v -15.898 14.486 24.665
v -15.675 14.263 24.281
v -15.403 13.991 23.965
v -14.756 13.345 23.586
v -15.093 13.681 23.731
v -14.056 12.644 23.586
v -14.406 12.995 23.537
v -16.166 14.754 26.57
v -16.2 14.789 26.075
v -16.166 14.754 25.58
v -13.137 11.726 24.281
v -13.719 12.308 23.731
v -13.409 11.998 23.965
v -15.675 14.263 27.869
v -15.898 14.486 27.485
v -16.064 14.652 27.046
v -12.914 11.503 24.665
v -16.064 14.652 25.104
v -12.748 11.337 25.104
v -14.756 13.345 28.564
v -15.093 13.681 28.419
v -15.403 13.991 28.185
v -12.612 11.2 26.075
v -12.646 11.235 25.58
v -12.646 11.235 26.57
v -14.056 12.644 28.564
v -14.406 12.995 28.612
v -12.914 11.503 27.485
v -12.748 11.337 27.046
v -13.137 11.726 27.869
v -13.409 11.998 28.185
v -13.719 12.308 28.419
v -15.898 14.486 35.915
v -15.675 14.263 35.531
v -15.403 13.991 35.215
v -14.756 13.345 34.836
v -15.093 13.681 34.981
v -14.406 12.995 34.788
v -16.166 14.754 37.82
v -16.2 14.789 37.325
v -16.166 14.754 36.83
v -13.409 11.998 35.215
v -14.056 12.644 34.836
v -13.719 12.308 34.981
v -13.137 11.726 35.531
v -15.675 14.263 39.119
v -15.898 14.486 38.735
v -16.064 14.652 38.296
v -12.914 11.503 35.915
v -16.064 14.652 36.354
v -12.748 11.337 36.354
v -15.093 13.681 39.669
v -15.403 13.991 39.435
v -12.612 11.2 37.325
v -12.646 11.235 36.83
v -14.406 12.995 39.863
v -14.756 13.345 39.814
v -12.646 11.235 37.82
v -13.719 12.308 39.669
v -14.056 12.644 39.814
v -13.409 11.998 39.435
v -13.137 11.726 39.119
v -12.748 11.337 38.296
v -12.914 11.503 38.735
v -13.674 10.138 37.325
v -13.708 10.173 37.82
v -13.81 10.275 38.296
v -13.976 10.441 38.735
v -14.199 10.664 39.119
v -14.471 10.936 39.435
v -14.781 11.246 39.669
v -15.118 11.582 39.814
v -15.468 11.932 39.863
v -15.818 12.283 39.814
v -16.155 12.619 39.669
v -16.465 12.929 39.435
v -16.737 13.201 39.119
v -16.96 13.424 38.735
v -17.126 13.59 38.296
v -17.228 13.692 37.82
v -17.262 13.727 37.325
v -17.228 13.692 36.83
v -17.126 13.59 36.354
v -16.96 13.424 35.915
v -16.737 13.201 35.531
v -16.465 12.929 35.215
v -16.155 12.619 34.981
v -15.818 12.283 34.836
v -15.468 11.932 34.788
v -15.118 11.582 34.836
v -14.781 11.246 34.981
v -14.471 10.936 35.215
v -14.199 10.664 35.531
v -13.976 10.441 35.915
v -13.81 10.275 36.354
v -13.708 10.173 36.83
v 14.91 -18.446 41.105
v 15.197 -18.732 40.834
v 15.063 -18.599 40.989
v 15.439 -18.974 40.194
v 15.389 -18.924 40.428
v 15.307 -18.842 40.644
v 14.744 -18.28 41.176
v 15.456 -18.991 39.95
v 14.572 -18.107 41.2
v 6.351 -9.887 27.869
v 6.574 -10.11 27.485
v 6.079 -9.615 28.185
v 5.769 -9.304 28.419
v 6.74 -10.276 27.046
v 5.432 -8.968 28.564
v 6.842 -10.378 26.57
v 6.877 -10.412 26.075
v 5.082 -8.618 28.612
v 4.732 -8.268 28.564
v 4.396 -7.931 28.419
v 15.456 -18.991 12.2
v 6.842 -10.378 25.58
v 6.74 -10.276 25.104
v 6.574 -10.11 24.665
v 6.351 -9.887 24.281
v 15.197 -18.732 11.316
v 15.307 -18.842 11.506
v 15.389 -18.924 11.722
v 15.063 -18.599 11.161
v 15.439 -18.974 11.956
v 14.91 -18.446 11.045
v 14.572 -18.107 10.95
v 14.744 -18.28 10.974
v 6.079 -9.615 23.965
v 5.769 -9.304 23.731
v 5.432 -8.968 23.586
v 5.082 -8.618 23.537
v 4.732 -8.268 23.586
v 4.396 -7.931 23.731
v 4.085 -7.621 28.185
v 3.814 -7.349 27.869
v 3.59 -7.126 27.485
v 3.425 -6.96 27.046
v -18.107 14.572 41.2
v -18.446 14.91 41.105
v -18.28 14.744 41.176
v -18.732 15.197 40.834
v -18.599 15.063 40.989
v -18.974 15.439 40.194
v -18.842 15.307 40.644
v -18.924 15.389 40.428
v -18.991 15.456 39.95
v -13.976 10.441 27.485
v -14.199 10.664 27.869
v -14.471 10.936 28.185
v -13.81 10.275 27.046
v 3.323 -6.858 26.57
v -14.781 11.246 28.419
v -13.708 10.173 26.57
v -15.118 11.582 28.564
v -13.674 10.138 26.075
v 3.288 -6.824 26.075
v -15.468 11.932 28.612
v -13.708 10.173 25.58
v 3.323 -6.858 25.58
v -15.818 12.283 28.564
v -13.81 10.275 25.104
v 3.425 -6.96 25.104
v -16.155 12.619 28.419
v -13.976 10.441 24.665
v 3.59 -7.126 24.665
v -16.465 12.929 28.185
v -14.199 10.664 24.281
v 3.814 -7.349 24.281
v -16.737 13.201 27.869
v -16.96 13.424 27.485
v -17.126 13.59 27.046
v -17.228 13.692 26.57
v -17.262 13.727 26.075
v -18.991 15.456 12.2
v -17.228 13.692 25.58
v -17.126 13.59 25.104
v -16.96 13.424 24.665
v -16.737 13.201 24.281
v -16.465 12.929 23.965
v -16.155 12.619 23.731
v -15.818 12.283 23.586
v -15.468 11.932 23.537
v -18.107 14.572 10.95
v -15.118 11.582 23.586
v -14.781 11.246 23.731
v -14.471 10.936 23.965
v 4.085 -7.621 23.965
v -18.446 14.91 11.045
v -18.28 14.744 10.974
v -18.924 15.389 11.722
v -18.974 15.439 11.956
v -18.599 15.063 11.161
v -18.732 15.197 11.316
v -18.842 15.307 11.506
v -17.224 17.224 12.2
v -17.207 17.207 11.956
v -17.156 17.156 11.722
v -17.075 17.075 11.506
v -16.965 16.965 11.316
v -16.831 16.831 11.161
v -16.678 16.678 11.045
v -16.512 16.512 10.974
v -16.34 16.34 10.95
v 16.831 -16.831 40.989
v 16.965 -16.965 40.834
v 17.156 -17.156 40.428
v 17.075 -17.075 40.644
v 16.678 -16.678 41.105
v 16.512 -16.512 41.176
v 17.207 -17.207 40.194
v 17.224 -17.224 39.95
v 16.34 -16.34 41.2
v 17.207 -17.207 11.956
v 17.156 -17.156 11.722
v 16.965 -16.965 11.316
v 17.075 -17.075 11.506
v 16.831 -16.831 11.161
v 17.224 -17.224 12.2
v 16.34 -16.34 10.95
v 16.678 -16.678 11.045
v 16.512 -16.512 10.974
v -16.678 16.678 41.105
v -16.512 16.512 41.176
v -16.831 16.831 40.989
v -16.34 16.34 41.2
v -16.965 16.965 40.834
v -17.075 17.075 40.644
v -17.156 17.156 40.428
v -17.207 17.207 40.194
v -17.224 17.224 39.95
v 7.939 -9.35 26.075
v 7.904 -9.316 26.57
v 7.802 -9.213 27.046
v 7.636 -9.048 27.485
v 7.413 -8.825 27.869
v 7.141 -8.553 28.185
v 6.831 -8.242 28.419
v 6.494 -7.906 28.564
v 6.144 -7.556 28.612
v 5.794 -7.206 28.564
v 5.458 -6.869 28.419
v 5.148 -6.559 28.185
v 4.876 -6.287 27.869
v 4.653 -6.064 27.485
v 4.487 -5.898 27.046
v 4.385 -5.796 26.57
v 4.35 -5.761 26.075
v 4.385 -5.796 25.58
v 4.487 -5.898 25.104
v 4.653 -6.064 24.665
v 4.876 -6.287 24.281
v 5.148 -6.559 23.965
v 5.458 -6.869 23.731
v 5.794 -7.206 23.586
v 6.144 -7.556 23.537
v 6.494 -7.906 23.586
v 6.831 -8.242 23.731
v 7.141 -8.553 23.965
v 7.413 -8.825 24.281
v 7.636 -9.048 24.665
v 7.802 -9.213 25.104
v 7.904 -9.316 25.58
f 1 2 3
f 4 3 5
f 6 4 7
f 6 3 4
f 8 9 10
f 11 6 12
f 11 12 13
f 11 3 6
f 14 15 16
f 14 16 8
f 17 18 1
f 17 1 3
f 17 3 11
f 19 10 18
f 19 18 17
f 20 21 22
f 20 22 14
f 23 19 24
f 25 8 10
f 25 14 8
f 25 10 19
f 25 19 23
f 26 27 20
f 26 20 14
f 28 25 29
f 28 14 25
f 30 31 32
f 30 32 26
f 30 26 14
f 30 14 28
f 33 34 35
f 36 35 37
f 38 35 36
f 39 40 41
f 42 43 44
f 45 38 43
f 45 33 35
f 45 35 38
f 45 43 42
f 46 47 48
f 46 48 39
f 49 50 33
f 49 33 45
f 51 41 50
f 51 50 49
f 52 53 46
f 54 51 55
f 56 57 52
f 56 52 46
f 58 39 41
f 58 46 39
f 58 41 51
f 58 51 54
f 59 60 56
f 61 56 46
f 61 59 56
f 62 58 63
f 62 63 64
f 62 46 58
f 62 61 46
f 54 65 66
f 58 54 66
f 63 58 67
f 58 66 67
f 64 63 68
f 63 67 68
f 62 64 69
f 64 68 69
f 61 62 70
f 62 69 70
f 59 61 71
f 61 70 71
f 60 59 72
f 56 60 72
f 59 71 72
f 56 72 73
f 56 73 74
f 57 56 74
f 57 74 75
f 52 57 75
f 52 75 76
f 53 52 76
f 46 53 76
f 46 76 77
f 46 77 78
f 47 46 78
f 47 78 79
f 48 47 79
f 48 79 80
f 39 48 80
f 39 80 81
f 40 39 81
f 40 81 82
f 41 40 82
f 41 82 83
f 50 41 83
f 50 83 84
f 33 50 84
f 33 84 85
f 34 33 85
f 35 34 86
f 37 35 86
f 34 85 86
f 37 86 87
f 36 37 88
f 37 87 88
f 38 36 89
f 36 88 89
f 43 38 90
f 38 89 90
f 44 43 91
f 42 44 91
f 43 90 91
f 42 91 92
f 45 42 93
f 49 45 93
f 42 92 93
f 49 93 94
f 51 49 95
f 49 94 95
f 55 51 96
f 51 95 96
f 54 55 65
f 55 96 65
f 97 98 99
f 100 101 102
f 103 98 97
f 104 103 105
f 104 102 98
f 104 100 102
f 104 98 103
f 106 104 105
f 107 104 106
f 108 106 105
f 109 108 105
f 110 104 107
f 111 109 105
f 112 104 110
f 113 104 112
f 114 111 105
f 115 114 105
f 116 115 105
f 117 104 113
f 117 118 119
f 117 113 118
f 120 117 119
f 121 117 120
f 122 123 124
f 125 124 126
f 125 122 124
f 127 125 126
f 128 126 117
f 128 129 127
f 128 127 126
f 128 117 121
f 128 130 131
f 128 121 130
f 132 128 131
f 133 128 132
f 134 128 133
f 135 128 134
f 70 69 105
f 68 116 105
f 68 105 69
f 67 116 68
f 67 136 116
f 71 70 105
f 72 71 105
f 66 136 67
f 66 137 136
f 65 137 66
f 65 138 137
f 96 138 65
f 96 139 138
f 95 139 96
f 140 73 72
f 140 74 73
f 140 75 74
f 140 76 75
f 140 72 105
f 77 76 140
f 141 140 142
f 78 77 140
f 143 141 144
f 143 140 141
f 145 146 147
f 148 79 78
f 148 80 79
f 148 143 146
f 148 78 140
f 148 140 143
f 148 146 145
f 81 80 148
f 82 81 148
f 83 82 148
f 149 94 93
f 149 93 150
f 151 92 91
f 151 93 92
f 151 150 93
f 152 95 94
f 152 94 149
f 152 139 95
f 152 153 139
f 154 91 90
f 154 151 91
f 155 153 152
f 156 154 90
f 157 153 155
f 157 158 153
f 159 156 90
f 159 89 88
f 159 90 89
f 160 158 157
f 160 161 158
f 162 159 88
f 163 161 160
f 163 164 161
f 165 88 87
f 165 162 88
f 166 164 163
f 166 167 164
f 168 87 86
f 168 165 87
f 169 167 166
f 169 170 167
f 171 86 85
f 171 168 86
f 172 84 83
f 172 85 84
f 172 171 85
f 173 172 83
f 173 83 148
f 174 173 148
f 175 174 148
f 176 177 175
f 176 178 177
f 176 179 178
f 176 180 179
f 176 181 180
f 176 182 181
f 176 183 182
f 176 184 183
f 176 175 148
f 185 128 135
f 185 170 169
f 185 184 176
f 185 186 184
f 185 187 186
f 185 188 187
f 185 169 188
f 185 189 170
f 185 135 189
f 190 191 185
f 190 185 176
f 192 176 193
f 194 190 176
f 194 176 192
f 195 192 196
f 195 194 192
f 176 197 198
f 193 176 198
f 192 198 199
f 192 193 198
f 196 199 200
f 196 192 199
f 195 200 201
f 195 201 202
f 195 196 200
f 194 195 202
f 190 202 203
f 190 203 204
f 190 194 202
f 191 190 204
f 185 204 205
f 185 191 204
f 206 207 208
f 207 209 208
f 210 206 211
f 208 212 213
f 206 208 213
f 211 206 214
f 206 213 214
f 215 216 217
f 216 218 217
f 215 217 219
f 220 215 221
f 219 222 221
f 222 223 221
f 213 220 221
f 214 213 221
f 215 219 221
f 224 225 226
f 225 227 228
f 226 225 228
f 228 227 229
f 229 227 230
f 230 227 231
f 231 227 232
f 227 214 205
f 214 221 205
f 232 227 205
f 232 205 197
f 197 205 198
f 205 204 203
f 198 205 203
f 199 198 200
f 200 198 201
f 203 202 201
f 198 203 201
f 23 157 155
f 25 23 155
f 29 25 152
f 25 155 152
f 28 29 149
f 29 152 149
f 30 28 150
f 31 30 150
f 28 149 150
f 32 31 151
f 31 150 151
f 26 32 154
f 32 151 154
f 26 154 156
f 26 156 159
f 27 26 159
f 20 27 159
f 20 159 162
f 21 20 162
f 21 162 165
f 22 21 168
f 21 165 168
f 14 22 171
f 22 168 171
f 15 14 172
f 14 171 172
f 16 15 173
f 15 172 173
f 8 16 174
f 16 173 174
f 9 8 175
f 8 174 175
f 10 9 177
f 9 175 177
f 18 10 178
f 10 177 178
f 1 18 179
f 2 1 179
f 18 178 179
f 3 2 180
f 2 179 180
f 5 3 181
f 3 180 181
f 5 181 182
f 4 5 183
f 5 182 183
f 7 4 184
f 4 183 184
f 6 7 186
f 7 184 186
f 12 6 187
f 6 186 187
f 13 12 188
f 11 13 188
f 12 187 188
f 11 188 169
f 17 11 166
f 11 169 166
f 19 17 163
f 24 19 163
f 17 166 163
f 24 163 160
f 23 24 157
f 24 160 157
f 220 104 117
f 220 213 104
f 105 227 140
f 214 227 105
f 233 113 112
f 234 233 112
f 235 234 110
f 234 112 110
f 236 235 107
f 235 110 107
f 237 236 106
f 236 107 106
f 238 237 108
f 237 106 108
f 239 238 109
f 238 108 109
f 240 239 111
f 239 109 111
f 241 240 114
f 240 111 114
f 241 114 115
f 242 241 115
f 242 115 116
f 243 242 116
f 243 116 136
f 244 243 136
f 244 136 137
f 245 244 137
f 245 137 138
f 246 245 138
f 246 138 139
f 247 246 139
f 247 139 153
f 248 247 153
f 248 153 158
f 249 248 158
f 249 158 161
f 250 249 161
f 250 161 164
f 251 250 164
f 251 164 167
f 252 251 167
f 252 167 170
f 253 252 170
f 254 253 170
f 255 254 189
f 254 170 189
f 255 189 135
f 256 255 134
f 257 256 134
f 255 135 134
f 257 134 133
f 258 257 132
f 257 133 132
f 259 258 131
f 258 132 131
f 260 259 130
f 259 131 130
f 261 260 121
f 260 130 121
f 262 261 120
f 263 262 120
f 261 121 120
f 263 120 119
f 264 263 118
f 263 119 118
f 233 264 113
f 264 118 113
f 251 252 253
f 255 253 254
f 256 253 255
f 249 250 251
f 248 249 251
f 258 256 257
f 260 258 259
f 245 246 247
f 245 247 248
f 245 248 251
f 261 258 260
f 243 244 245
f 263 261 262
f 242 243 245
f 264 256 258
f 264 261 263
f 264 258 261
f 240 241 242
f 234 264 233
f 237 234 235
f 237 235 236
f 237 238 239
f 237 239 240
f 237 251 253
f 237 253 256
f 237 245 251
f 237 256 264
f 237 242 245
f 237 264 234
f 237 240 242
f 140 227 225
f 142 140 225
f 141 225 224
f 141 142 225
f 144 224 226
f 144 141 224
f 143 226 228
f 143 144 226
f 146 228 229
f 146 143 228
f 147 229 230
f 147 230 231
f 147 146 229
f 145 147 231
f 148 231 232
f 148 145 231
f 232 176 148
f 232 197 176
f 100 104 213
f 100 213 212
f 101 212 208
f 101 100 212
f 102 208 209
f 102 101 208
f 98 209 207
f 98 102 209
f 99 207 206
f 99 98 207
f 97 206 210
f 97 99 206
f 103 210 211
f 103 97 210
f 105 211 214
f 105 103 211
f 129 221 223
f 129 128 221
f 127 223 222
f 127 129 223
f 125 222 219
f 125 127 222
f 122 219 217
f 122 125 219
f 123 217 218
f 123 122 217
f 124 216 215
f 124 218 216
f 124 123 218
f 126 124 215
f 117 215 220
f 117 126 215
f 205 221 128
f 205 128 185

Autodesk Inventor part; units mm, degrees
sketch "Sketch1" plane through (0, 0, 0) normal (0, 0, 1) x (1, 0, 0)
  circle A0 centre (-10, 20.9) radius 1.875 projected
  circle A1 centre (-10, -20.9) radius 1.875 projected
  circle A2 centre (10, 20.9) radius 1.875 projected
  circle A3 centre (10, -20.9) radius 1.875 projected
  circle A4 centre (20.8, -14.4) radius 2.075 projected
  circle A5 centre (20.8, 14.4) radius 2.075 projected
  circle A6 centre (-20.8, 14.4) radius 2.075 projected
  circle A7 centre (-20.8, -14.4) radius 2.075 projected
  line L0 (16.9, -16.9) -> (-16.9, -16.9) projected
  line L1 (-16.9, -16.9) -> (-16.9, 16.9) projected
  line L2 (-16.9, 16.9) -> (16.9, 16.9) projected
  line L3 (16.9, 16.9) -> (16.9, -16.9) projected
  line L4 (-17.05, 24.9) -> (-17.05, 22.55) projected
  line L5 (-17.05, 22.55) -> (-22.55, 17.05) projected
  line L6 (-22.55, 17.05) -> (-24.9, 17.05) projected
  line L7 (-24.9, 17.05) -> (-24.9, -17.05) projected
  line L8 (-24.9, -17.05) -> (-22.55, -17.05) projected
  line L9 (-22.55, -17.05) -> (-17.05, -22.55) projected
  line L10 (-17.05, -22.55) -> (-17.05, -24.9) projected
  line L11 (-17.05, -24.9) -> (17.05, -24.9) projected
  line L12 (17.05, -24.9) -> (17.05, -22.55) projected
  line L13 (17.05, -22.55) -> (22.55, -17.05) projected
  line L14 (22.55, -17.05) -> (24.9, -17.05) projected
  line L15 (24.9, -17.05) -> (24.9, 17.05) projected
  line L16 (24.9, 17.05) -> (22.55, 17.05) projected
  line L17 (22.55, 17.05) -> (17.05, 22.55) projected
  line L18 (17.05, 22.55) -> (17.05, 24.9) projected
  line L19 (17.05, 24.9) -> (-17.05, 24.9) projected
  line L20 (-16.975, 24.825) -> (-16.975, 22.5189)
  line L21 (-16.975, 22.5189) -> (-22.5189, 16.975)
  line L22 (-22.5189, 16.975) -> (-24.825, 16.975)
  line L23 (-24.825, 16.975) -> (-24.825, -16.975)
  line L24 (-24.825, -16.975) -> (-22.5189, -16.975)
  line L25 (-22.5189, -16.975) -> (-16.975, -22.5189)
  line L26 (-16.975, -22.5189) -> (-16.975, -24.825)
  line L27 (-16.975, -24.825) -> (16.975, -24.825)
  line L28 (16.975, -24.825) -> (16.975, -22.5189)
  line L29 (16.975, -22.5189) -> (22.5189, -16.975)
  line L30 (22.5189, -16.975) -> (24.825, -16.975)
  line L31 (24.825, -16.975) -> (24.825, 16.975)
  line L32 (24.825, 16.975) -> (22.5189, 16.975)
  line L33 (22.5189, 16.975) -> (16.975, 22.5189)
  line L34 (16.975, 22.5189) -> (16.975, 24.825)
  line L35 (16.975, 24.825) -> (-16.975, 24.825)
  point P0 (0, 0)
  dimension "d0" = 0.075
ref_plane "Work Plane1" through (-24.9, -24.9, 7.7) normal (0, 0, 1) x (1, 0, 0)
extrude "Extrusion1" add sketch "Sketch1" along normal blind 2.5 from surface at 7.7 contours A0 | A1 | A2 | A3 | A4 | A5 | A6 | A7 | L0 L1 L2 L3 | L35 L34 L33 L32 L31 L30 L29 L28 L27 L26 L25 L24 L23 L22 L21 L20
sketch "Sketch2" plane through (-16.975, -24.825, 10.2) normal (0, 0, 1) x (1, 0, 0)
  line L0 (0, 47.3439) -> (0, 49.65) projected
  line L1 (-5.5439, 41.8) -> (0, 47.3439) projected
  line L2 (-7.85, 41.8) -> (-5.5439, 41.8) projected
  line L3 (-7.85, 7.85) -> (-7.85, 41.8) projected
  line L4 (-5.5439, 7.85) -> (-7.85, 7.85) projected
  line L5 (0, 2.3061) -> (-5.5439, 7.85) projected
  line L6 (0, 0) -> (0, 2.3061) projected
  line L7 (33.95, 0) -> (0, 0) projected
  line L8 (33.95, 2.3061) -> (33.95, 0) projected
  line L9 (39.4939, 7.85) -> (33.95, 2.3061) projected
  line L10 (41.8, 7.85) -> (39.4939, 7.85) projected
  line L11 (41.8, 41.8) -> (41.8, 7.85) projected
  line L12 (39.4939, 41.8) -> (41.8, 41.8) projected
  line L13 (33.95, 47.3439) -> (39.4939, 41.8) projected
  line L14 (33.95, 49.65) -> (33.95, 47.3439) projected
  line L15 (0, 49.65) -> (33.95, 49.65) projected
  line L16 (33.95, 49.65) -> (41.8, 49.65)
  line L17 (41.8, 49.65) -> (41.8, 41.8)
  line L18 (41.8, 41.8) -> (33.95, 41.8)
  line L19 (33.95, 41.8) -> (33.95, 49.65)
  line L20 (41.8, 49.65) -> (31.8, 49.65)
  line L21 (31.8, 49.65) -> (31.8, 44.65)
  line L22 (36.8, 39.65) -> (41.8, 39.65)
  line L23 (41.8, 39.65) -> (41.8, 49.65)
  line L24 (31.8, 44.65) -> (36.8, 39.65)
  line L25 (36.722, 5.078) -> (-2.772, 44.572)
  line L26 (34.9542, 3.3103) -> (-4.5397, 42.8042)
  line L27 (33.95, 0.7789) -> (-7.0711, 41.8)
  line L28 (27.6579, 0) -> (-7.85, 35.5079)
  point P0 (16.975, 24.825)
  point P1 (31.8, 39.65)
  point P2 (34.9542, 3.3103)
  dimension "d3" = 10
  dimension "d4" = 10
  dimension "d5" = 5
  dimension "d6" = 5
  dimension "d7" = 2.5
  dimension "d8" = 2.5
  dimension "d9" = 5
extrude "Extrusion2" add sketch "Sketch2" along normal blind 31.75 contours L25 L9 L26 L1 | L27 L8 L7 L28 L3 L2
sketch "Sketch3" plane through (10.6829, -24.825, 10.2) normal (-0.7071068, -0.7071068, 0) x (0.7071068, -0.7071068, 0)
  line L0 (0, 0) -> (-50.2157, 0) projected
  line L1 (0, 0) -> (0, 31.75) projected
  line L2 (-50.2157, 31.75) -> (0, 31.75) projected
  line L3 (-50.2157, 0) -> (-50.2157, 31.75) projected
  line L4 (-50.2157, 15.875) -> (0, 15.875)
  line L5 (-5.7329, 4.625) -> (-44.4829, 4.625)
  line L6 (-44.4829, 4.625) -> (-44.4829, 27.125)
  line L7 (-44.4829, 27.125) -> (-5.7329, 27.125)
  line L8 (-5.7329, 27.125) -> (-5.7329, 4.625)
  line L9 (-5.7329, 4.625) -> (-44.4829, 27.125) construction
  line L10 (-44.4829, 4.625) -> (-5.7329, 27.125) construction
  circle A0 centre (-44.4829, 27.125) radius 1.9375
  circle A1 centre (-44.4829, 15.875) radius 1.9375
  line L11 (-25.1079, 15.875) -> (-5.7329, 15.875)
  circle A2 centre (-15.4204, 15.875) radius 1.9375
  line L12 (-53.0343, 0) -> (2.8186, 0) projected
  line L13 (-53.0343, 0) -> (-53.0343, 31.75) projected
  line L14 (2.8186, 31.75) -> (-53.0343, 31.75) projected
  line L15 (2.8186, 0) -> (2.8186, 31.75) projected
  line L16 (-0.75, 31) -> (-0.75, 0.75)
  line L17 (-0.75, 0.75) -> (-49.4657, 0.75)
  line L18 (-49.4657, 0.75) -> (-49.4657, 31)
  line L19 (-49.4657, 31) -> (-0.75, 31)
  circle A3 centre (-44.4829, 27.125) radius 2.5375
  circle A4 centre (-44.4829, 15.875) radius 2.5375
  circle A5 centre (-15.4204, 15.875) radius 2.5375
  point P0 (-25.1079, -10.2)
  point P1 (0, 0)
  point P2 (-0.75, 15.875)
  point P3 (-49.4657, 15.875)
  point P4 (0, 0)
  point P5 (0, 31.75)
  dimension "d12" = 38.75
  dimension "d13" = 22.5
  dimension "d14" = 3.875
  dimension "d15" = 3.875
  dimension "d16" = 3.875
  dimension "d21" = 0.75
  dimension "d22" = 5.075
  dimension "d23" = 5.075
  dimension "d24" = 5.075
extrude "Extrusion3" cut sketch "Sketch3" along normal blind 2.5 from surface at -10 contours L0 L3 L4 L18 L17 L16 L1 | L1 L14 L15 L12 | L12 L13 L14 L3 | L4 L16 L19 L18 L3 L2 L1
extrude "Extrusion4" cut sketch "Sketch3" against normal up to surface (5 mm away) contours A1 L6 L4 | L4 L6 A1 | A2 L4 | L4 A2 | L6 A1 L4 | L4 A1 L6 | A0 L6 L7 | L7 L6 A0
extrude "Extrusion5" cut sketch "Sketch3" against normal blind 1.5 from surface at -7.5 contours A4 L6 A1 L4 | L4 A1 L6 A4 | A5 L4 A2 | L4 A2 A5 | A1 L6 L4 | L4 L6 A1 | A4 L4 A1 L6 | L6 A1 L4 A4 | A2 L4 | L4 A2 | A3 L6 A0 L7 | L7 A0 L6 A3 | L6 A1 L4 | L4 A1 L6 | A0 L6 L7 | L7 L6 A0
extrude "Extrusion6" [suppressed]
sketch "Sketch4" plane through (0, 0, 0) normal (0, 1, 0) x (-1, 0, 0)
  line L0 (22.9, 0.025) -> (-22.9, 0.025) projected
  line L1 (22.9, 42.1) -> (22.9, 0.025) projected
  line L2 (22.9, 42.1) -> (17.05, 42.1) projected
  line L3 (17.05, 7.7) -> (17.05, 42.1) projected
  line L4 (-17.05, 7.7) -> (17.05, 7.7) projected
  line L5 (-17.05, 7.7) -> (-17.05, 42.1) projected
  line L6 (-17.05, 42.1) -> (-22.9, 42.1) projected
  line L7 (-22.9, 0.025) -> (-22.9, 42.1) projected
  circle A0 centre (19.9, 34.8) radius 2.0625 projected
  circle A1 centre (-19.9, 34.8) radius 2.0625 projected
  circle A2 centre (19.9, 15) radius 2.0625 projected
  circle A3 centre (-19.9, 15) radius 2.0625 projected
  circle A4 centre (10, 3.85) radius 1.5625 projected
  circle A5 centre (-10, 3.85) radius 1.5625 projected
  line L8 (-17.05, 24.9) -> (17.05, 24.9)
  circle A6 centre (0, 24.9) radius 16.25
  point P0 (0, 0)
  dimension "d27" = 32.5
ref_plane "Work Plane2" through (-22.9, 24.9, 0.025) normal (0, 1, 0) x (0, 0, 1)
extrude "Extrusion7" [suppressed]
ref_plane "Work Plane3" through (0, 0, 0) normal (0.7071068, -0.7071068, 0) x (0, 0, -1)
mirror "Mirror1" [suppressed]
extrude "Extrusion8" cut sketch "Sketch2" against normal up to surface (2.5 mm away) contours L0 L15 L21 L24 L19 L18 L22 L11 L10 L9 L25 L1 | L25 L9 L26 L1 | L15 L14 L19 L24 L21 | L26 L9 L8 L27 L2 L1 | L16 L17 L12 L13 L14 | L13 L18 L24 L19 | L24 L18 L19 | L12 L11 L22 L24 L18 | L28 L7 L6 L5 L4 L3
sketch "Sketch5" plane through (-16.975, -24.825, 41.95) normal (0, 0, 1) x (1, 0, 0)
  line L0 (-7.85, 41.8) -> (-7.85, 35.5079) projected
  line L1 (-7.85, 35.5079) -> (27.6579, 0) projected
  line L2 (27.6579, 0) -> (33.95, 0) projected
  line L3 (33.95, 0) -> (33.95, 0.7789) projected
  line L4 (33.95, 0.7789) -> (-7.0711, 41.8) projected
  line L5 (-7.0711, 41.8) -> (-7.85, 41.8) projected
  point P0 (16.975, 24.825)
extrude "Extrusion9" cut sketch "Sketch5" against normal up to surface (34.25 mm away)
fillet "Fillet1" radius 1.25 4 edges at (-18.1075, 16.3397, 41.2) (16.3397, -18.1075, 41.2) (16.3397, -18.1075, 10.95) (-18.1075, 16.3397, 10.95)
equation "\"d6\" = d5"
properties part number "Mirror Plate Horizontal"
